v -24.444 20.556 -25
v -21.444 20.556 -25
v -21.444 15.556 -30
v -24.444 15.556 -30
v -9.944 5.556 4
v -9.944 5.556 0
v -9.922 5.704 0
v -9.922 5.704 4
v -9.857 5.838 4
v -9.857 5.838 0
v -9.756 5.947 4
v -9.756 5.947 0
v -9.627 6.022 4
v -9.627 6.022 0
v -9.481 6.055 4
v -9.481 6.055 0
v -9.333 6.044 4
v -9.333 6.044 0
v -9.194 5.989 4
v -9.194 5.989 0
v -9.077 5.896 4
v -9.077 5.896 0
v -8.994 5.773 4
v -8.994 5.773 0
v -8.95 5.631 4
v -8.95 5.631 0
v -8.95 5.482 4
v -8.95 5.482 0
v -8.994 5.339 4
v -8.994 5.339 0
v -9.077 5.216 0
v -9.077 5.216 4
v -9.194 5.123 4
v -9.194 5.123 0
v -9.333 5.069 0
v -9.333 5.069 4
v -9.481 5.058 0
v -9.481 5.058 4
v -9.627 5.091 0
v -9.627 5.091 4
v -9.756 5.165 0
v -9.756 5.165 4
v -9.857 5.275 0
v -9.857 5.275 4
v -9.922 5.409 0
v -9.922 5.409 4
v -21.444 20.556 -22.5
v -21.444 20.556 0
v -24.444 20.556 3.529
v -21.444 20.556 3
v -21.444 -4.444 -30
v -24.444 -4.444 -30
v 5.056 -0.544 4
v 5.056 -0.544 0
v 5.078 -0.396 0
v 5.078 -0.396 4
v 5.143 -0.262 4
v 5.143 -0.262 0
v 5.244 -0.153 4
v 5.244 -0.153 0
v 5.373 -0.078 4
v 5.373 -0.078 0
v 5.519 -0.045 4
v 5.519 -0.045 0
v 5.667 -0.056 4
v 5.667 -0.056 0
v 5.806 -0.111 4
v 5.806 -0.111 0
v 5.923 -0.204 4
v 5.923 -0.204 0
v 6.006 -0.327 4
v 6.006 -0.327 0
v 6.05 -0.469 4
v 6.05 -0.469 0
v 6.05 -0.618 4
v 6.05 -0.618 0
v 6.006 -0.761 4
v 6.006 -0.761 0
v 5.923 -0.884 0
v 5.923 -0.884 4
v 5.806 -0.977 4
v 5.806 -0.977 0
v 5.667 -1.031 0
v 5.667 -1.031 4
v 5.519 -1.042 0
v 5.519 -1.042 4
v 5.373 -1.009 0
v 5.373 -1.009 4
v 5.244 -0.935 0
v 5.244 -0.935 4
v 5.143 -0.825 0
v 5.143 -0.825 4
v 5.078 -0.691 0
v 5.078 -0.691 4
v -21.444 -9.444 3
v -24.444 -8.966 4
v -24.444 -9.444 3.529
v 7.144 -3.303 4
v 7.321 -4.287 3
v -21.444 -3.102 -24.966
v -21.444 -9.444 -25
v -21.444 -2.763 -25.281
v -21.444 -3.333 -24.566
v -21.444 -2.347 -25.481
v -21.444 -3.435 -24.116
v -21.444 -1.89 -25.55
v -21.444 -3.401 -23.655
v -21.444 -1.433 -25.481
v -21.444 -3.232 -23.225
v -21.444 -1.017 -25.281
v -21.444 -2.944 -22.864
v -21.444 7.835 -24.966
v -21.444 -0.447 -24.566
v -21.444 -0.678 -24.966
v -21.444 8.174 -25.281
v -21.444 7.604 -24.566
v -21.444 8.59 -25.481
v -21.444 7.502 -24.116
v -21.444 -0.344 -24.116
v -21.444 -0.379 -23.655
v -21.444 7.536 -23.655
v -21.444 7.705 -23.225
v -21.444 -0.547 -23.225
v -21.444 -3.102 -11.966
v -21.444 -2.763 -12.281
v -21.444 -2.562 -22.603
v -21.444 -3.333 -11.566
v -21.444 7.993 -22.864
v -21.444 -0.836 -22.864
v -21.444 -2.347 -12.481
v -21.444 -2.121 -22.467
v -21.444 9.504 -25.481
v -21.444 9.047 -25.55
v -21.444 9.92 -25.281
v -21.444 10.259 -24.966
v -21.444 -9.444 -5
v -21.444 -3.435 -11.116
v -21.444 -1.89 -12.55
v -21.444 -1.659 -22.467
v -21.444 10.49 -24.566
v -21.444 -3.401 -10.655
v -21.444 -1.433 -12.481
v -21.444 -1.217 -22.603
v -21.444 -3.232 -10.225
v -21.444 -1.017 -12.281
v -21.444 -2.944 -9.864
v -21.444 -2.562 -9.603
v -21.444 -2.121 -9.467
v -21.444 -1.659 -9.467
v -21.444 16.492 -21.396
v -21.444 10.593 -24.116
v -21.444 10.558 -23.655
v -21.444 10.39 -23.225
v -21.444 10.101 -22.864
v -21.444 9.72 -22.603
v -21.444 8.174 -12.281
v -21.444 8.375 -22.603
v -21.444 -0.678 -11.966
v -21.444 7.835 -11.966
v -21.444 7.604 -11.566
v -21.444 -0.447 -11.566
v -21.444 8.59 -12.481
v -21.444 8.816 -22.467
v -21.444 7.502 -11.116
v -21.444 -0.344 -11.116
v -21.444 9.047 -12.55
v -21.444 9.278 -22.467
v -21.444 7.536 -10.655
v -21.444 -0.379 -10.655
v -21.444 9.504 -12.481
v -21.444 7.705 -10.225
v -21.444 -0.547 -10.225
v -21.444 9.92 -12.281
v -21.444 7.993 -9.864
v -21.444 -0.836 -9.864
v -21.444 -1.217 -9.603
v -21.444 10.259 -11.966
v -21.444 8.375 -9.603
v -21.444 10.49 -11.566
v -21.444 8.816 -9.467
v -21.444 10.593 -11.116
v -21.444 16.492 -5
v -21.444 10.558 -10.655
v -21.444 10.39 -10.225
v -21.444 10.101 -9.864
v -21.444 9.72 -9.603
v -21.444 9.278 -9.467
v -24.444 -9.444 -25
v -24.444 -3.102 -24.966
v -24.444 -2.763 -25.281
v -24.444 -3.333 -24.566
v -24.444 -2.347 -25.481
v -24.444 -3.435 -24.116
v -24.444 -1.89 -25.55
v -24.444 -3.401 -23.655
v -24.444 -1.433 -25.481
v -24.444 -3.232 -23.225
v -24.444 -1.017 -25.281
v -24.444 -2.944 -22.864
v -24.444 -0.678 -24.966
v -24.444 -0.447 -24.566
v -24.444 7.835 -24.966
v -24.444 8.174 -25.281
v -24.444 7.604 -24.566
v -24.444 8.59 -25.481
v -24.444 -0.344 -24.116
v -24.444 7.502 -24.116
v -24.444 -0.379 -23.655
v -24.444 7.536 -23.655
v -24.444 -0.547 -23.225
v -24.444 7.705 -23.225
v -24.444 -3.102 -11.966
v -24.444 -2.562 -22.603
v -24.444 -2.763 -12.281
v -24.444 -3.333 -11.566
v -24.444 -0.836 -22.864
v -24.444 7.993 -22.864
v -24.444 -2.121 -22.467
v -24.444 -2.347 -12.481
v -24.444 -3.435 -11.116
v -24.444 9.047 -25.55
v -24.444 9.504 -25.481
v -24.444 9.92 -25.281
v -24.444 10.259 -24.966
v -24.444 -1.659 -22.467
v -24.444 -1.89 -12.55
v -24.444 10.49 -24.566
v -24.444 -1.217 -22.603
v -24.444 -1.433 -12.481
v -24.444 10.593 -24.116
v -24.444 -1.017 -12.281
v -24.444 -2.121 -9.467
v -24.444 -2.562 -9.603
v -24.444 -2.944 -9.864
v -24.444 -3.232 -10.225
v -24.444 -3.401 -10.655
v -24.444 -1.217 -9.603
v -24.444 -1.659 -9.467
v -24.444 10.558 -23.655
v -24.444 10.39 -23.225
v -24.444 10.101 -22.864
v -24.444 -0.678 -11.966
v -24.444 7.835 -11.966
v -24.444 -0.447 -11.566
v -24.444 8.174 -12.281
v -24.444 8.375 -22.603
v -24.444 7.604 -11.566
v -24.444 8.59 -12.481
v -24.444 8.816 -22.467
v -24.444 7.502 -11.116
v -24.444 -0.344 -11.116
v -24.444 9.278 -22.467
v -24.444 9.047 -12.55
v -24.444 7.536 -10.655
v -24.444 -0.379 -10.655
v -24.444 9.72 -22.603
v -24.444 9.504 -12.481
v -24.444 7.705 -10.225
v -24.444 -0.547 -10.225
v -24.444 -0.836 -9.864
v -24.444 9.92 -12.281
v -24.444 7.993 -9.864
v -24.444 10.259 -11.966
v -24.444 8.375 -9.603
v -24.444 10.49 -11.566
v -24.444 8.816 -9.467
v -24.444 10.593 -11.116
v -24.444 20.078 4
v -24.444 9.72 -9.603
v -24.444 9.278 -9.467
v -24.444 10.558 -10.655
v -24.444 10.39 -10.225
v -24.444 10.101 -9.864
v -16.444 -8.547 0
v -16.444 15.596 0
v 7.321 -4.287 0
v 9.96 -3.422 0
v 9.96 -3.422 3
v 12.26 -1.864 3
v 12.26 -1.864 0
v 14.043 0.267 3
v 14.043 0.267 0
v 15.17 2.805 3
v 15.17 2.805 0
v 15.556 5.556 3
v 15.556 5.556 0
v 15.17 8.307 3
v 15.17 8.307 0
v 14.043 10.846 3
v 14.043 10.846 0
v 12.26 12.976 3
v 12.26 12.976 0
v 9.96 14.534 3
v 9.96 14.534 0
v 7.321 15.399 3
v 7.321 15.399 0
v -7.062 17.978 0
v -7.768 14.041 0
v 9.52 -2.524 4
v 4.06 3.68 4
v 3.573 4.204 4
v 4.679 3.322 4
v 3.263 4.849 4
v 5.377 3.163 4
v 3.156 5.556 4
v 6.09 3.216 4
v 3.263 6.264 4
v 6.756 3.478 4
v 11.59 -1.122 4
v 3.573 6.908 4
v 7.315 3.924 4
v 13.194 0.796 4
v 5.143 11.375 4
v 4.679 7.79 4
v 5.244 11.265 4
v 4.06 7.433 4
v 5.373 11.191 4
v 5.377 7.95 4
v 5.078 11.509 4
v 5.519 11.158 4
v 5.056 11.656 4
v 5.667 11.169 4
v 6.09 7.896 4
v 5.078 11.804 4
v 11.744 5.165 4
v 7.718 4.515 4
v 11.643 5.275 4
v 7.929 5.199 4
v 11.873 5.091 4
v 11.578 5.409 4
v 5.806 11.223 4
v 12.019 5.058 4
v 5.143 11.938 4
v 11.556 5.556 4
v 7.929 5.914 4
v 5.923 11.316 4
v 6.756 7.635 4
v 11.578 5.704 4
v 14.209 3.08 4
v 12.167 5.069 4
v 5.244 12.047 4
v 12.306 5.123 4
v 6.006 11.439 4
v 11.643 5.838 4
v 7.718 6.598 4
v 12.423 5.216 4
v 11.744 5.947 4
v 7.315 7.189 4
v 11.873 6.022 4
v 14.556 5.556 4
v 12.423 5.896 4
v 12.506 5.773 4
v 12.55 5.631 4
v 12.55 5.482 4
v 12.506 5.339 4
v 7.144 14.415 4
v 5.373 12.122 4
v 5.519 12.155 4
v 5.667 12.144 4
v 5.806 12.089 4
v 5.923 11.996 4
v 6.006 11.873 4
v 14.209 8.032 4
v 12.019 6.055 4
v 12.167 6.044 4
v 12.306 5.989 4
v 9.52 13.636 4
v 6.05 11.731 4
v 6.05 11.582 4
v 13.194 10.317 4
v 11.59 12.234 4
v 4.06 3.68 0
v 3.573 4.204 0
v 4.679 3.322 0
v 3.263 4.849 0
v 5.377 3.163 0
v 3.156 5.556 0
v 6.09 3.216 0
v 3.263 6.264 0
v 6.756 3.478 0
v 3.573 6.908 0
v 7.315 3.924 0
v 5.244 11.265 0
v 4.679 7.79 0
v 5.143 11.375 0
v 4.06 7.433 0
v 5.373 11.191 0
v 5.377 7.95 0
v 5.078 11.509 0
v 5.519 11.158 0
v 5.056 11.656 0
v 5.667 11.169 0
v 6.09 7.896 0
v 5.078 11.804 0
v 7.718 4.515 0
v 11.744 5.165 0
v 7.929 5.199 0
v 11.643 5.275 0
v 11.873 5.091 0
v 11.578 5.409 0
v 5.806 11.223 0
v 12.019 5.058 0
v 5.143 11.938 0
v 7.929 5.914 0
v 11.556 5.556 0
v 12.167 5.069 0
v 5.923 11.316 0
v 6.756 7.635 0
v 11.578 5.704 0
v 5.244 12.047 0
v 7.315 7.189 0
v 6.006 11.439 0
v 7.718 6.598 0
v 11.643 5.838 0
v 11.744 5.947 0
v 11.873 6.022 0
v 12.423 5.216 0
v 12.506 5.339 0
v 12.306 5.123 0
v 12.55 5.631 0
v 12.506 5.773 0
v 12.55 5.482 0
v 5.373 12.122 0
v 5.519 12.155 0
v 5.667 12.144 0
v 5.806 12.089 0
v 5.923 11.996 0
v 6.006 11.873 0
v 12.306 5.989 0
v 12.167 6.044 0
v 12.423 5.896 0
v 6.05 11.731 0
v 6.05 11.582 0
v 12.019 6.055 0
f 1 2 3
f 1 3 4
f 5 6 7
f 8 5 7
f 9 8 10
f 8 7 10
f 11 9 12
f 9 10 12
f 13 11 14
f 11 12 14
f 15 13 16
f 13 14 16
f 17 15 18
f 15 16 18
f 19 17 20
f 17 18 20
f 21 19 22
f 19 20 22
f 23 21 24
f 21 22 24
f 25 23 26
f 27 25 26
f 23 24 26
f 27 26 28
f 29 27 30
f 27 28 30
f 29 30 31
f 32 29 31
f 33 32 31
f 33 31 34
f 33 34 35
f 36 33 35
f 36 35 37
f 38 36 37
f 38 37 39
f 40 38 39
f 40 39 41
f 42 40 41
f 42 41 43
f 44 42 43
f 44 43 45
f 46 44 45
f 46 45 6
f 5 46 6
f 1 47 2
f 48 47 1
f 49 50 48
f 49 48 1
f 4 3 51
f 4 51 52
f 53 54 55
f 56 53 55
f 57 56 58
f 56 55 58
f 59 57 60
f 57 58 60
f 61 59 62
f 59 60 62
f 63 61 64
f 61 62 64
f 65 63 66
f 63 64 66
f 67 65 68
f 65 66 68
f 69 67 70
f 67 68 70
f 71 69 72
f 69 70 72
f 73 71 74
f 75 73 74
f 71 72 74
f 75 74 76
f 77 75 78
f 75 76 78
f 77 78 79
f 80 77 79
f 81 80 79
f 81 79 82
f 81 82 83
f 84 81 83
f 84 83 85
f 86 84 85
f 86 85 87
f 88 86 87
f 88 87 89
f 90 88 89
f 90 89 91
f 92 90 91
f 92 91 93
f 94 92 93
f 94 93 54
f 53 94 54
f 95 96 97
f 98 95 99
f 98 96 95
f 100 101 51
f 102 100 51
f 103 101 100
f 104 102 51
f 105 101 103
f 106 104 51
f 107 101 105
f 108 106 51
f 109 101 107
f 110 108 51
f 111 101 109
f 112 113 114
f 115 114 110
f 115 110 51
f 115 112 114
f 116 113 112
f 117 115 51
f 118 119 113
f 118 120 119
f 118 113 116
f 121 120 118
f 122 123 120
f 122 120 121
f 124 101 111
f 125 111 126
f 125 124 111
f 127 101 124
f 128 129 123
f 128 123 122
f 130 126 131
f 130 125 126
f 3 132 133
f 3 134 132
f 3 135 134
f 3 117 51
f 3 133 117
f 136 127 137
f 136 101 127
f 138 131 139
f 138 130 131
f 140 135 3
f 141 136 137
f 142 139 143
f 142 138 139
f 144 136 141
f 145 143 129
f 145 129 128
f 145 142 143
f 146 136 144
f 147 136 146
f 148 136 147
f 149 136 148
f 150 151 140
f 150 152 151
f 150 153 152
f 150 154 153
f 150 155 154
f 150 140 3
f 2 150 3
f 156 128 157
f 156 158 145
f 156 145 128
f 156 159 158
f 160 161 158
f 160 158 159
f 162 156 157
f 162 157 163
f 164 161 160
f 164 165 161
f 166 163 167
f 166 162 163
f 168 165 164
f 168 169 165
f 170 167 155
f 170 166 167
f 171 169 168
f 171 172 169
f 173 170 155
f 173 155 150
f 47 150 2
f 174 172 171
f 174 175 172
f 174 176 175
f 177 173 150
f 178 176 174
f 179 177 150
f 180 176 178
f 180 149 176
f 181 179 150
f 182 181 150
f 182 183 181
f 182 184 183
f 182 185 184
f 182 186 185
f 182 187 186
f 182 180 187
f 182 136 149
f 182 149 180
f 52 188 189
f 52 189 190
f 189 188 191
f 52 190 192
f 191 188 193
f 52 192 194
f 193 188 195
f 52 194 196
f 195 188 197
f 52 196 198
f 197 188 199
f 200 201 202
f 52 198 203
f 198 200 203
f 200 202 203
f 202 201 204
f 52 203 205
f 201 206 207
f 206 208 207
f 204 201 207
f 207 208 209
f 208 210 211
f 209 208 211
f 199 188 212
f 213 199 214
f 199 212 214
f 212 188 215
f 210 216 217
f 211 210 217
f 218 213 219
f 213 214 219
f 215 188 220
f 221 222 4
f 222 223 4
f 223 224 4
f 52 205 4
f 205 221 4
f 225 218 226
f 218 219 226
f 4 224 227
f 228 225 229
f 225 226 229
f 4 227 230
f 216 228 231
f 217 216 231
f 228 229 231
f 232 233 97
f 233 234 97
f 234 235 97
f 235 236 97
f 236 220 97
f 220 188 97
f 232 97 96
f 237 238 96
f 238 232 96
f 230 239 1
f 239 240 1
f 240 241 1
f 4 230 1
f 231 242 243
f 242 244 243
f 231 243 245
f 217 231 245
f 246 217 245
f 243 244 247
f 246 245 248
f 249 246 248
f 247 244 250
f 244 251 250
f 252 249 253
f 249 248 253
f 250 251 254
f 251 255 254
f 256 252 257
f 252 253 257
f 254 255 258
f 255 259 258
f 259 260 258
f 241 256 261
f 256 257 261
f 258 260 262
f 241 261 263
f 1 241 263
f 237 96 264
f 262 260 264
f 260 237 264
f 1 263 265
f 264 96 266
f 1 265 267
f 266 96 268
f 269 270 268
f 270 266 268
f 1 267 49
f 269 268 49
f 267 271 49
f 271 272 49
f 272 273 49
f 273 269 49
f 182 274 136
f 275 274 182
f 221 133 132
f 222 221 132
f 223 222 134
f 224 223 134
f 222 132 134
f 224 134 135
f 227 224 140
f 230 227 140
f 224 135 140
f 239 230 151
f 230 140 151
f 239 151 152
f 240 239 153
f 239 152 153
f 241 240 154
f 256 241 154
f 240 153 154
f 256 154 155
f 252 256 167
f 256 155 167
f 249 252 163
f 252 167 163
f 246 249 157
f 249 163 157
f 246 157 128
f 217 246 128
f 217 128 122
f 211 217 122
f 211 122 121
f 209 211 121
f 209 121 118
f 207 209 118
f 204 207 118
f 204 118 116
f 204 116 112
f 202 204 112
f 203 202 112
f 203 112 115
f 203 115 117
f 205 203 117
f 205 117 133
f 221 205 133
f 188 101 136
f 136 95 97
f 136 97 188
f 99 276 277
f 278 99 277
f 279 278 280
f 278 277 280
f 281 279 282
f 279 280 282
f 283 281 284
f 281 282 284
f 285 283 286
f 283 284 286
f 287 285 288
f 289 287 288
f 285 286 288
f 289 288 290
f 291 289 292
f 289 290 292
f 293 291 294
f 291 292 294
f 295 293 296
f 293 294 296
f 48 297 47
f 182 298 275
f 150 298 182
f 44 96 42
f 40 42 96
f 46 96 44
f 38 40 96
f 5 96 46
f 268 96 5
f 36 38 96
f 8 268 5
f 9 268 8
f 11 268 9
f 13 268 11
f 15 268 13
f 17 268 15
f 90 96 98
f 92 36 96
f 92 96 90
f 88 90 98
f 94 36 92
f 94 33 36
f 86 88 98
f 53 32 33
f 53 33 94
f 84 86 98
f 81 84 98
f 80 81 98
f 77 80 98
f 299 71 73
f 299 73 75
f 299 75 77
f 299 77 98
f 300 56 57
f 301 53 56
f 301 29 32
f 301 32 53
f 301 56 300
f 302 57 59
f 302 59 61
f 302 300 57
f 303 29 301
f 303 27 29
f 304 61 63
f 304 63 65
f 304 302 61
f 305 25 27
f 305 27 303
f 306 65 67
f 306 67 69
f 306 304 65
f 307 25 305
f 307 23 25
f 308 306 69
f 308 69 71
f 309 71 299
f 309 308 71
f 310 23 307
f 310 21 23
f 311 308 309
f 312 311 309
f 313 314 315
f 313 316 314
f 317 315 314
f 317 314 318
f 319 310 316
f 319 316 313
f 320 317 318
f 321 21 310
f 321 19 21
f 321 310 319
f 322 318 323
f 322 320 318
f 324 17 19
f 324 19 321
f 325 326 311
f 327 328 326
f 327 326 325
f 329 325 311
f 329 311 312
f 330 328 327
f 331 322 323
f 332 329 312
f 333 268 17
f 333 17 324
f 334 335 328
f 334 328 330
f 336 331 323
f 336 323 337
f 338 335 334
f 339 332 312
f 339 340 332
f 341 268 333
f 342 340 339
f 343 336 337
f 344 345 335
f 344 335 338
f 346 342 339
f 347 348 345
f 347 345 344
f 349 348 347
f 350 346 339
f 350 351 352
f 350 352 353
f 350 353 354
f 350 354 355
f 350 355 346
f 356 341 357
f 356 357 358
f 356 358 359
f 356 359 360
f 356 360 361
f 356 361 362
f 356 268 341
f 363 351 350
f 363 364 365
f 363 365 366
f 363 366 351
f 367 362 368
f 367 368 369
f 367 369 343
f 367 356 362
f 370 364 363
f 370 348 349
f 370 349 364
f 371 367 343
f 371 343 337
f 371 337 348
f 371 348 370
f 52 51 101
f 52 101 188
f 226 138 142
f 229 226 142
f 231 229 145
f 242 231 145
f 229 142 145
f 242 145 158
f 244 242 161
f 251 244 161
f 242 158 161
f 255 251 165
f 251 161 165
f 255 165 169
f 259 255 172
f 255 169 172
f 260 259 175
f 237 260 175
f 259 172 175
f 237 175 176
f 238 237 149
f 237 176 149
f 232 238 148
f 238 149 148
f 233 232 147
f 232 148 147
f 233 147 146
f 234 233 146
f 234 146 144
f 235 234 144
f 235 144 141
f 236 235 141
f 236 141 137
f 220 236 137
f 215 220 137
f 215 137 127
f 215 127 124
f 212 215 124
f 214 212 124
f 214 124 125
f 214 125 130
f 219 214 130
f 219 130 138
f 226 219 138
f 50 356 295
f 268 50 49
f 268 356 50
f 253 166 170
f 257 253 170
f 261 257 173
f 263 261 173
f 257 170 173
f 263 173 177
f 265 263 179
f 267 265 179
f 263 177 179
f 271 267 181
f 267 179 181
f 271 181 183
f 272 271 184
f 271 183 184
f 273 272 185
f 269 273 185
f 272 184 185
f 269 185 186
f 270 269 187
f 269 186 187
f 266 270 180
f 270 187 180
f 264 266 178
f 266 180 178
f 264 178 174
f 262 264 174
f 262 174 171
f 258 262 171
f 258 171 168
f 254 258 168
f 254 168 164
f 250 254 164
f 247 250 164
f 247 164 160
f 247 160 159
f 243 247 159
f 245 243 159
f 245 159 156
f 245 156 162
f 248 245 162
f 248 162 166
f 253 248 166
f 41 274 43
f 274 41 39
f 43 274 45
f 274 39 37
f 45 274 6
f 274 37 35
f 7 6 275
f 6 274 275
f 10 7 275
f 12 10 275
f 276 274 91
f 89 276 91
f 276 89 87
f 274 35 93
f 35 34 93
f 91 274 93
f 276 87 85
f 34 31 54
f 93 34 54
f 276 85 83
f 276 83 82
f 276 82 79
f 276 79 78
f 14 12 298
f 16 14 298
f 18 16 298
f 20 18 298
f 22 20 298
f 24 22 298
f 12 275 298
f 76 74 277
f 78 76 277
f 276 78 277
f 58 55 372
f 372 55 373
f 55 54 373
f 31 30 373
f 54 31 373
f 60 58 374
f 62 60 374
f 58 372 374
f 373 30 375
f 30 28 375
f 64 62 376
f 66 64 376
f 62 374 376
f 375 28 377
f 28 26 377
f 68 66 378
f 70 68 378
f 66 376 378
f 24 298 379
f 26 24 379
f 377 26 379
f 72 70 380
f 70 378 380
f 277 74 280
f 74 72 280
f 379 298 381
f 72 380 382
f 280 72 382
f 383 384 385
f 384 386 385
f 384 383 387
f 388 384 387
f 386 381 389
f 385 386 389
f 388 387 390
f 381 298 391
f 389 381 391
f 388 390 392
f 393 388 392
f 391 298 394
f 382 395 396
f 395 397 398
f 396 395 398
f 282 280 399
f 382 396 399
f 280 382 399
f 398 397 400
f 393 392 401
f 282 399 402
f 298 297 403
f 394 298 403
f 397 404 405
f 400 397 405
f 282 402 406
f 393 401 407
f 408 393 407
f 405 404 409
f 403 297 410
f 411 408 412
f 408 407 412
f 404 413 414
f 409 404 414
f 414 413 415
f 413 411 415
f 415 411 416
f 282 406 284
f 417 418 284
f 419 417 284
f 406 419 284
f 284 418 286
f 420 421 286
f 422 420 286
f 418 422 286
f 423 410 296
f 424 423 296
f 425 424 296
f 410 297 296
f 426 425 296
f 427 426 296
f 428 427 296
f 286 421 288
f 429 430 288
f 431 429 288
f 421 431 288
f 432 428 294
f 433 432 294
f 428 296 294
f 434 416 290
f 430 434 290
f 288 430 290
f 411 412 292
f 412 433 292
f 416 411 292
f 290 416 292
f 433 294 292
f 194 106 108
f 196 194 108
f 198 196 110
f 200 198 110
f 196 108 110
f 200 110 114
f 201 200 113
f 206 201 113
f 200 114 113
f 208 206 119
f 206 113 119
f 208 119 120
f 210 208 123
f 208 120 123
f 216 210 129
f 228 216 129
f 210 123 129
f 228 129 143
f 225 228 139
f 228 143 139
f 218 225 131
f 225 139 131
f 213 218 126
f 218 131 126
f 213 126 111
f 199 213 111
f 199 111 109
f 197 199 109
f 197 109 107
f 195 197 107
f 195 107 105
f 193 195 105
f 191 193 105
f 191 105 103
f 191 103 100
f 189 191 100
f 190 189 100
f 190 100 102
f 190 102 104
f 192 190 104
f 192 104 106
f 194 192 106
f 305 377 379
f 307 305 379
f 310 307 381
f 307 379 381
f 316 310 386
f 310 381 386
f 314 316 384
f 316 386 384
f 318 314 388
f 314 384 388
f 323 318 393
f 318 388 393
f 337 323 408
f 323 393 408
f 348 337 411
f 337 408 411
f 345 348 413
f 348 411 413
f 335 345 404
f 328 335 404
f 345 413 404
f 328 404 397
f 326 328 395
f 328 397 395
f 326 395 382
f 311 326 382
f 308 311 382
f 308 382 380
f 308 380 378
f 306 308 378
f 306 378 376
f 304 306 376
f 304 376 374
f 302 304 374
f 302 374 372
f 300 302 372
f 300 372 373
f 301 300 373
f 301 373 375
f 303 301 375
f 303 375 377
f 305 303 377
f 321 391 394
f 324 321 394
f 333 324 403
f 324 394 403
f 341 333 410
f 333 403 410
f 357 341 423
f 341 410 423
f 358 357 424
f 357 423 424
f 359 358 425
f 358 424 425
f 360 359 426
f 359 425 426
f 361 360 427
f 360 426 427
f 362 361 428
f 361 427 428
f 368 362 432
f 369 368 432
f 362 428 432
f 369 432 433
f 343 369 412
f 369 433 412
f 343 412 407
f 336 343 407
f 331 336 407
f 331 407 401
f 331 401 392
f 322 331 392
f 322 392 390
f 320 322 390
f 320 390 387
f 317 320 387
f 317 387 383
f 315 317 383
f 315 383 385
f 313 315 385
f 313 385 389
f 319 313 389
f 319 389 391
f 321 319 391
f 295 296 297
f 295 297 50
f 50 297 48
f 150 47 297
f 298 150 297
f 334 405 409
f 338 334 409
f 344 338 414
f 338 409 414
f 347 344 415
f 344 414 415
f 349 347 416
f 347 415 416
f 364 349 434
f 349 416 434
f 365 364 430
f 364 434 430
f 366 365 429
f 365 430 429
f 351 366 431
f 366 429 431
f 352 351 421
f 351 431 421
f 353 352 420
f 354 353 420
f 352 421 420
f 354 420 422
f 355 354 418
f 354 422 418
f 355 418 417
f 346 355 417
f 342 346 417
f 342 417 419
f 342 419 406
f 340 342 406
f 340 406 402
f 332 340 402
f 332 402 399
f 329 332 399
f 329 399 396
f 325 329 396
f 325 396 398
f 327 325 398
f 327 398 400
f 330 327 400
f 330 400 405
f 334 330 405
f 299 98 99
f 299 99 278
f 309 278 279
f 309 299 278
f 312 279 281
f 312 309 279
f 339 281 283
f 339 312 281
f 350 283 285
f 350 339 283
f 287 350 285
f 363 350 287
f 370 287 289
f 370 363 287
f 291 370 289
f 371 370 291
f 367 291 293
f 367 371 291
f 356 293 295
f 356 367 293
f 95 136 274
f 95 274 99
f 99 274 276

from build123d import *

# Parameters (mm, degrees)
BOSS_EXTRUDE1_DEPTH = 4
SKETCH3_W           = 3
SKETCH3_H           = 30
BOSS_EXTRUDE2_DEPTH = 30
BOSS_EXTRUDE3_DEPTH = 4
CHAMFER1_SIZE       = 5
CHAMFER2_SIZE       = 5
CHAMFER3_SIZE       = 1
CUT_EXTRUDE3_REACH  = 53.88
SKETCH6_R           = 1.55
CUT_EXTRUDE4_REACH  = 45.819
SKETCH7_R           = 2.4
CUT_EXTRUDE5_REACH  = 45.819
SKETCH8_R           = 0.5


with BuildPart() as part:
    # Sketch1 → Boss-Extrude1 (new body)
    with BuildSketch(Plane.XY):
        with BuildLine():
            Line((-21.444, -9.44375), (7.320666414, -4.286816212))
            ThreePointArc((7.320666414, -4.286816212), (15.556, 5.55625), (7.320666414, 15.399316212))
            Line((7.320666414, 15.399316212), (-21.444, 20.55625))
            Line((-21.444, 20.55625), (-24.444, 20.55625))
            Line((-24.444, 20.55625), (-24.444, -9.44375))
            Line((-24.444, -9.44375), (-21.444, -9.44375))
        make_face()
    extrude(amount=BOSS_EXTRUDE1_DEPTH)

    # Sketch3 → Boss-Extrude2 (add)
    with BuildSketch(Plane(origin=(0, 0, 0), x_dir=(-1, 0, 0), z_dir=(0, 0, -1))):
        with Locations((22.944, 5.55625)):
            Rectangle(SKETCH3_W, SKETCH3_H)
    extrude(amount=BOSS_EXTRUDE2_DEPTH)

    # Sketch4 → Boss-Extrude3 (add)
    with BuildSketch(Plane(origin=(2.902788428, 16.191354052, 0), x_dir=(0.9843066211686926, -0.17646664139001428, 0), z_dir=(0.17646664139001428, 0.9843066211686926, 0))):
        Polygon((-24.734963581, 22.5), (-10.123324385, 0), (-10.123324385, -0.5), (-24.734963581, -0.5), align=None)
    extrude(amount=-BOSS_EXTRUDE3_DEPTH)

    # Chamfer1
    chamfer1_edges = [part.edges().sort_by_distance(p)[0] for p in [
        (-21.444, 3.524362825, 0),
    ]]
    chamfer(chamfer1_edges, length=CHAMFER1_SIZE)

    # Chamfer2
    chamfer2_edges = [part.edges().sort_by_distance(p)[0] for p in [
        (-22.944, -9.44375, -30),
        (-22.944, 20.55625, -30),
    ]]
    chamfer(chamfer2_edges, length=CHAMFER2_SIZE)

    # Chamfer3
    chamfer3_edges = [part.edges().sort_by_distance(p)[0] for p in [
        (-7.061666793, -6.865283106, 4),
        (15.556, 5.55625, 4),
        (-7.061666793, 17.977783106, 4),
    ]]
    chamfer(chamfer3_edges, length=CHAMFER3_SIZE)

    # Sketch6 → Cut-Extrude3 (cut, up to next)
    with BuildSketch(Plane(origin=(-21.444, 0, 0), x_dir=(0, 0, -1), z_dir=(1, 0, 0)), mode=Mode.PRIVATE) as cut_extrude3_sk1:
        with Locations((11, 9.04722098)):
            Circle(SKETCH6_R)
    cut_extrude3_tool1 = extrude(cut_extrude3_sk1.sketch, amount=-CUT_EXTRUDE3_REACH, mode=Mode.PRIVATE) & part.part
    # Sketch6 → Cut-Extrude3 (cut, up to next)
    with BuildSketch(Plane(origin=(-21.444, 0, 0), x_dir=(0, 0, -1), z_dir=(1, 0, 0)), mode=Mode.PRIVATE) as cut_extrude3_sk2:
        with Locations((24, 9.04722098)):
            Circle(SKETCH6_R)
    cut_extrude3_tool2 = extrude(cut_extrude3_sk2.sketch, amount=-CUT_EXTRUDE3_REACH, mode=Mode.PRIVATE) & part.part
    # Sketch6 → Cut-Extrude3 (cut, up to next)
    with BuildSketch(Plane(origin=(-21.444, 0, 0), x_dir=(0, 0, -1), z_dir=(1, 0, 0)), mode=Mode.PRIVATE) as cut_extrude3_sk3:
        with Locations((11, -1.889802378)):
            Circle(SKETCH6_R)
    cut_extrude3_tool3 = extrude(cut_extrude3_sk3.sketch, amount=-CUT_EXTRUDE3_REACH, mode=Mode.PRIVATE) & part.part
    # Sketch6 → Cut-Extrude3 (cut, up to next)
    with BuildSketch(Plane(origin=(-21.444, 0, 0), x_dir=(0, 0, -1), z_dir=(1, 0, 0)), mode=Mode.PRIVATE) as cut_extrude3_sk4:
        with Locations((24, -1.889802378)):
            Circle(SKETCH6_R)
    cut_extrude3_tool4 = extrude(cut_extrude3_sk4.sketch, amount=-CUT_EXTRUDE3_REACH, mode=Mode.PRIVATE) & part.part
    add(cut_extrude3_tool1.solids().sort_by_distance((-21.444, 9.047221, -11))[0], mode=Mode.SUBTRACT)
    add(cut_extrude3_tool2.solids().sort_by_distance((-21.444, 9.047221, -24))[0], mode=Mode.SUBTRACT)
    add(cut_extrude3_tool3.solids().sort_by_distance((-21.444, -1.889802, -11))[0], mode=Mode.SUBTRACT)
    add(cut_extrude3_tool4.solids().sort_by_distance((-21.444, -1.889802, -24))[0], mode=Mode.SUBTRACT)

    # Sketch7 → Cut-Extrude4 (cut, up to next)
    with BuildSketch(Plane(origin=(0, 0, 0), x_dir=(-1, 0, 0), z_dir=(0, 0, -1)), mode=Mode.PRIVATE) as cut_extrude4_sk1:
        with Locations((-5.556, 5.55625)):
            Circle(SKETCH7_R)
    cut_extrude4_tool1 = extrude(cut_extrude4_sk1.sketch, amount=-CUT_EXTRUDE4_REACH, mode=Mode.PRIVATE) & part.part
    add(cut_extrude4_tool1.solids().sort_by_distance((5.556, 5.55625, 0))[0], mode=Mode.SUBTRACT)

    # Sketch8 → Cut-Extrude5 (cut, up to next)
    with BuildSketch(Plane(origin=(0, 0, 0), x_dir=(-1, 0, 0), z_dir=(0, 0, -1)), mode=Mode.PRIVATE) as cut_extrude5_sk1:
        with Locations((9.444, 5.55625)):
            Circle(SKETCH8_R)
    cut_extrude5_tool1 = extrude(cut_extrude5_sk1.sketch, amount=-CUT_EXTRUDE5_REACH, mode=Mode.PRIVATE) & part.part
    # Sketch8 → Cut-Extrude5 (cut, up to next)
    with BuildSketch(Plane(origin=(0, 0, 0), x_dir=(-1, 0, 0), z_dir=(0, 0, -1)), mode=Mode.PRIVATE) as cut_extrude5_sk2:
        with Locations((-5.556, 11.65625)):
            Circle(SKETCH8_R)
    cut_extrude5_tool2 = extrude(cut_extrude5_sk2.sketch, amount=-CUT_EXTRUDE5_REACH, mode=Mode.PRIVATE) & part.part
    # Sketch8 → Cut-Extrude5 (cut, up to next)
    with BuildSketch(Plane(origin=(0, 0, 0), x_dir=(-1, 0, 0), z_dir=(0, 0, -1)), mode=Mode.PRIVATE) as cut_extrude5_sk3:
        with Locations((-5.556, -0.54375)):
            Circle(SKETCH8_R)
    cut_extrude5_tool3 = extrude(cut_extrude5_sk3.sketch, amount=-CUT_EXTRUDE5_REACH, mode=Mode.PRIVATE) & part.part
    # Sketch8 → Cut-Extrude5 (cut, up to next)
    with BuildSketch(Plane(origin=(0, 0, 0), x_dir=(-1, 0, 0), z_dir=(0, 0, -1)), mode=Mode.PRIVATE) as cut_extrude5_sk4:
        with Locations((-12.056, 5.55625)):
            Circle(SKETCH8_R)
    cut_extrude5_tool4 = extrude(cut_extrude5_sk4.sketch, amount=-CUT_EXTRUDE5_REACH, mode=Mode.PRIVATE) & part.part
    add(cut_extrude5_tool1.solids().sort_by_distance((-9.444, 5.55625, 0))[0], mode=Mode.SUBTRACT)
    add(cut_extrude5_tool2.solids().sort_by_distance((5.556, 11.65625, 0))[0], mode=Mode.SUBTRACT)
    add(cut_extrude5_tool3.solids().sort_by_distance((5.556, -0.54375, 0))[0], mode=Mode.SUBTRACT)
    add(cut_extrude5_tool4.solids().sort_by_distance((12.056, 5.55625, 0))[0], mode=Mode.SUBTRACT)


solid = part.part
